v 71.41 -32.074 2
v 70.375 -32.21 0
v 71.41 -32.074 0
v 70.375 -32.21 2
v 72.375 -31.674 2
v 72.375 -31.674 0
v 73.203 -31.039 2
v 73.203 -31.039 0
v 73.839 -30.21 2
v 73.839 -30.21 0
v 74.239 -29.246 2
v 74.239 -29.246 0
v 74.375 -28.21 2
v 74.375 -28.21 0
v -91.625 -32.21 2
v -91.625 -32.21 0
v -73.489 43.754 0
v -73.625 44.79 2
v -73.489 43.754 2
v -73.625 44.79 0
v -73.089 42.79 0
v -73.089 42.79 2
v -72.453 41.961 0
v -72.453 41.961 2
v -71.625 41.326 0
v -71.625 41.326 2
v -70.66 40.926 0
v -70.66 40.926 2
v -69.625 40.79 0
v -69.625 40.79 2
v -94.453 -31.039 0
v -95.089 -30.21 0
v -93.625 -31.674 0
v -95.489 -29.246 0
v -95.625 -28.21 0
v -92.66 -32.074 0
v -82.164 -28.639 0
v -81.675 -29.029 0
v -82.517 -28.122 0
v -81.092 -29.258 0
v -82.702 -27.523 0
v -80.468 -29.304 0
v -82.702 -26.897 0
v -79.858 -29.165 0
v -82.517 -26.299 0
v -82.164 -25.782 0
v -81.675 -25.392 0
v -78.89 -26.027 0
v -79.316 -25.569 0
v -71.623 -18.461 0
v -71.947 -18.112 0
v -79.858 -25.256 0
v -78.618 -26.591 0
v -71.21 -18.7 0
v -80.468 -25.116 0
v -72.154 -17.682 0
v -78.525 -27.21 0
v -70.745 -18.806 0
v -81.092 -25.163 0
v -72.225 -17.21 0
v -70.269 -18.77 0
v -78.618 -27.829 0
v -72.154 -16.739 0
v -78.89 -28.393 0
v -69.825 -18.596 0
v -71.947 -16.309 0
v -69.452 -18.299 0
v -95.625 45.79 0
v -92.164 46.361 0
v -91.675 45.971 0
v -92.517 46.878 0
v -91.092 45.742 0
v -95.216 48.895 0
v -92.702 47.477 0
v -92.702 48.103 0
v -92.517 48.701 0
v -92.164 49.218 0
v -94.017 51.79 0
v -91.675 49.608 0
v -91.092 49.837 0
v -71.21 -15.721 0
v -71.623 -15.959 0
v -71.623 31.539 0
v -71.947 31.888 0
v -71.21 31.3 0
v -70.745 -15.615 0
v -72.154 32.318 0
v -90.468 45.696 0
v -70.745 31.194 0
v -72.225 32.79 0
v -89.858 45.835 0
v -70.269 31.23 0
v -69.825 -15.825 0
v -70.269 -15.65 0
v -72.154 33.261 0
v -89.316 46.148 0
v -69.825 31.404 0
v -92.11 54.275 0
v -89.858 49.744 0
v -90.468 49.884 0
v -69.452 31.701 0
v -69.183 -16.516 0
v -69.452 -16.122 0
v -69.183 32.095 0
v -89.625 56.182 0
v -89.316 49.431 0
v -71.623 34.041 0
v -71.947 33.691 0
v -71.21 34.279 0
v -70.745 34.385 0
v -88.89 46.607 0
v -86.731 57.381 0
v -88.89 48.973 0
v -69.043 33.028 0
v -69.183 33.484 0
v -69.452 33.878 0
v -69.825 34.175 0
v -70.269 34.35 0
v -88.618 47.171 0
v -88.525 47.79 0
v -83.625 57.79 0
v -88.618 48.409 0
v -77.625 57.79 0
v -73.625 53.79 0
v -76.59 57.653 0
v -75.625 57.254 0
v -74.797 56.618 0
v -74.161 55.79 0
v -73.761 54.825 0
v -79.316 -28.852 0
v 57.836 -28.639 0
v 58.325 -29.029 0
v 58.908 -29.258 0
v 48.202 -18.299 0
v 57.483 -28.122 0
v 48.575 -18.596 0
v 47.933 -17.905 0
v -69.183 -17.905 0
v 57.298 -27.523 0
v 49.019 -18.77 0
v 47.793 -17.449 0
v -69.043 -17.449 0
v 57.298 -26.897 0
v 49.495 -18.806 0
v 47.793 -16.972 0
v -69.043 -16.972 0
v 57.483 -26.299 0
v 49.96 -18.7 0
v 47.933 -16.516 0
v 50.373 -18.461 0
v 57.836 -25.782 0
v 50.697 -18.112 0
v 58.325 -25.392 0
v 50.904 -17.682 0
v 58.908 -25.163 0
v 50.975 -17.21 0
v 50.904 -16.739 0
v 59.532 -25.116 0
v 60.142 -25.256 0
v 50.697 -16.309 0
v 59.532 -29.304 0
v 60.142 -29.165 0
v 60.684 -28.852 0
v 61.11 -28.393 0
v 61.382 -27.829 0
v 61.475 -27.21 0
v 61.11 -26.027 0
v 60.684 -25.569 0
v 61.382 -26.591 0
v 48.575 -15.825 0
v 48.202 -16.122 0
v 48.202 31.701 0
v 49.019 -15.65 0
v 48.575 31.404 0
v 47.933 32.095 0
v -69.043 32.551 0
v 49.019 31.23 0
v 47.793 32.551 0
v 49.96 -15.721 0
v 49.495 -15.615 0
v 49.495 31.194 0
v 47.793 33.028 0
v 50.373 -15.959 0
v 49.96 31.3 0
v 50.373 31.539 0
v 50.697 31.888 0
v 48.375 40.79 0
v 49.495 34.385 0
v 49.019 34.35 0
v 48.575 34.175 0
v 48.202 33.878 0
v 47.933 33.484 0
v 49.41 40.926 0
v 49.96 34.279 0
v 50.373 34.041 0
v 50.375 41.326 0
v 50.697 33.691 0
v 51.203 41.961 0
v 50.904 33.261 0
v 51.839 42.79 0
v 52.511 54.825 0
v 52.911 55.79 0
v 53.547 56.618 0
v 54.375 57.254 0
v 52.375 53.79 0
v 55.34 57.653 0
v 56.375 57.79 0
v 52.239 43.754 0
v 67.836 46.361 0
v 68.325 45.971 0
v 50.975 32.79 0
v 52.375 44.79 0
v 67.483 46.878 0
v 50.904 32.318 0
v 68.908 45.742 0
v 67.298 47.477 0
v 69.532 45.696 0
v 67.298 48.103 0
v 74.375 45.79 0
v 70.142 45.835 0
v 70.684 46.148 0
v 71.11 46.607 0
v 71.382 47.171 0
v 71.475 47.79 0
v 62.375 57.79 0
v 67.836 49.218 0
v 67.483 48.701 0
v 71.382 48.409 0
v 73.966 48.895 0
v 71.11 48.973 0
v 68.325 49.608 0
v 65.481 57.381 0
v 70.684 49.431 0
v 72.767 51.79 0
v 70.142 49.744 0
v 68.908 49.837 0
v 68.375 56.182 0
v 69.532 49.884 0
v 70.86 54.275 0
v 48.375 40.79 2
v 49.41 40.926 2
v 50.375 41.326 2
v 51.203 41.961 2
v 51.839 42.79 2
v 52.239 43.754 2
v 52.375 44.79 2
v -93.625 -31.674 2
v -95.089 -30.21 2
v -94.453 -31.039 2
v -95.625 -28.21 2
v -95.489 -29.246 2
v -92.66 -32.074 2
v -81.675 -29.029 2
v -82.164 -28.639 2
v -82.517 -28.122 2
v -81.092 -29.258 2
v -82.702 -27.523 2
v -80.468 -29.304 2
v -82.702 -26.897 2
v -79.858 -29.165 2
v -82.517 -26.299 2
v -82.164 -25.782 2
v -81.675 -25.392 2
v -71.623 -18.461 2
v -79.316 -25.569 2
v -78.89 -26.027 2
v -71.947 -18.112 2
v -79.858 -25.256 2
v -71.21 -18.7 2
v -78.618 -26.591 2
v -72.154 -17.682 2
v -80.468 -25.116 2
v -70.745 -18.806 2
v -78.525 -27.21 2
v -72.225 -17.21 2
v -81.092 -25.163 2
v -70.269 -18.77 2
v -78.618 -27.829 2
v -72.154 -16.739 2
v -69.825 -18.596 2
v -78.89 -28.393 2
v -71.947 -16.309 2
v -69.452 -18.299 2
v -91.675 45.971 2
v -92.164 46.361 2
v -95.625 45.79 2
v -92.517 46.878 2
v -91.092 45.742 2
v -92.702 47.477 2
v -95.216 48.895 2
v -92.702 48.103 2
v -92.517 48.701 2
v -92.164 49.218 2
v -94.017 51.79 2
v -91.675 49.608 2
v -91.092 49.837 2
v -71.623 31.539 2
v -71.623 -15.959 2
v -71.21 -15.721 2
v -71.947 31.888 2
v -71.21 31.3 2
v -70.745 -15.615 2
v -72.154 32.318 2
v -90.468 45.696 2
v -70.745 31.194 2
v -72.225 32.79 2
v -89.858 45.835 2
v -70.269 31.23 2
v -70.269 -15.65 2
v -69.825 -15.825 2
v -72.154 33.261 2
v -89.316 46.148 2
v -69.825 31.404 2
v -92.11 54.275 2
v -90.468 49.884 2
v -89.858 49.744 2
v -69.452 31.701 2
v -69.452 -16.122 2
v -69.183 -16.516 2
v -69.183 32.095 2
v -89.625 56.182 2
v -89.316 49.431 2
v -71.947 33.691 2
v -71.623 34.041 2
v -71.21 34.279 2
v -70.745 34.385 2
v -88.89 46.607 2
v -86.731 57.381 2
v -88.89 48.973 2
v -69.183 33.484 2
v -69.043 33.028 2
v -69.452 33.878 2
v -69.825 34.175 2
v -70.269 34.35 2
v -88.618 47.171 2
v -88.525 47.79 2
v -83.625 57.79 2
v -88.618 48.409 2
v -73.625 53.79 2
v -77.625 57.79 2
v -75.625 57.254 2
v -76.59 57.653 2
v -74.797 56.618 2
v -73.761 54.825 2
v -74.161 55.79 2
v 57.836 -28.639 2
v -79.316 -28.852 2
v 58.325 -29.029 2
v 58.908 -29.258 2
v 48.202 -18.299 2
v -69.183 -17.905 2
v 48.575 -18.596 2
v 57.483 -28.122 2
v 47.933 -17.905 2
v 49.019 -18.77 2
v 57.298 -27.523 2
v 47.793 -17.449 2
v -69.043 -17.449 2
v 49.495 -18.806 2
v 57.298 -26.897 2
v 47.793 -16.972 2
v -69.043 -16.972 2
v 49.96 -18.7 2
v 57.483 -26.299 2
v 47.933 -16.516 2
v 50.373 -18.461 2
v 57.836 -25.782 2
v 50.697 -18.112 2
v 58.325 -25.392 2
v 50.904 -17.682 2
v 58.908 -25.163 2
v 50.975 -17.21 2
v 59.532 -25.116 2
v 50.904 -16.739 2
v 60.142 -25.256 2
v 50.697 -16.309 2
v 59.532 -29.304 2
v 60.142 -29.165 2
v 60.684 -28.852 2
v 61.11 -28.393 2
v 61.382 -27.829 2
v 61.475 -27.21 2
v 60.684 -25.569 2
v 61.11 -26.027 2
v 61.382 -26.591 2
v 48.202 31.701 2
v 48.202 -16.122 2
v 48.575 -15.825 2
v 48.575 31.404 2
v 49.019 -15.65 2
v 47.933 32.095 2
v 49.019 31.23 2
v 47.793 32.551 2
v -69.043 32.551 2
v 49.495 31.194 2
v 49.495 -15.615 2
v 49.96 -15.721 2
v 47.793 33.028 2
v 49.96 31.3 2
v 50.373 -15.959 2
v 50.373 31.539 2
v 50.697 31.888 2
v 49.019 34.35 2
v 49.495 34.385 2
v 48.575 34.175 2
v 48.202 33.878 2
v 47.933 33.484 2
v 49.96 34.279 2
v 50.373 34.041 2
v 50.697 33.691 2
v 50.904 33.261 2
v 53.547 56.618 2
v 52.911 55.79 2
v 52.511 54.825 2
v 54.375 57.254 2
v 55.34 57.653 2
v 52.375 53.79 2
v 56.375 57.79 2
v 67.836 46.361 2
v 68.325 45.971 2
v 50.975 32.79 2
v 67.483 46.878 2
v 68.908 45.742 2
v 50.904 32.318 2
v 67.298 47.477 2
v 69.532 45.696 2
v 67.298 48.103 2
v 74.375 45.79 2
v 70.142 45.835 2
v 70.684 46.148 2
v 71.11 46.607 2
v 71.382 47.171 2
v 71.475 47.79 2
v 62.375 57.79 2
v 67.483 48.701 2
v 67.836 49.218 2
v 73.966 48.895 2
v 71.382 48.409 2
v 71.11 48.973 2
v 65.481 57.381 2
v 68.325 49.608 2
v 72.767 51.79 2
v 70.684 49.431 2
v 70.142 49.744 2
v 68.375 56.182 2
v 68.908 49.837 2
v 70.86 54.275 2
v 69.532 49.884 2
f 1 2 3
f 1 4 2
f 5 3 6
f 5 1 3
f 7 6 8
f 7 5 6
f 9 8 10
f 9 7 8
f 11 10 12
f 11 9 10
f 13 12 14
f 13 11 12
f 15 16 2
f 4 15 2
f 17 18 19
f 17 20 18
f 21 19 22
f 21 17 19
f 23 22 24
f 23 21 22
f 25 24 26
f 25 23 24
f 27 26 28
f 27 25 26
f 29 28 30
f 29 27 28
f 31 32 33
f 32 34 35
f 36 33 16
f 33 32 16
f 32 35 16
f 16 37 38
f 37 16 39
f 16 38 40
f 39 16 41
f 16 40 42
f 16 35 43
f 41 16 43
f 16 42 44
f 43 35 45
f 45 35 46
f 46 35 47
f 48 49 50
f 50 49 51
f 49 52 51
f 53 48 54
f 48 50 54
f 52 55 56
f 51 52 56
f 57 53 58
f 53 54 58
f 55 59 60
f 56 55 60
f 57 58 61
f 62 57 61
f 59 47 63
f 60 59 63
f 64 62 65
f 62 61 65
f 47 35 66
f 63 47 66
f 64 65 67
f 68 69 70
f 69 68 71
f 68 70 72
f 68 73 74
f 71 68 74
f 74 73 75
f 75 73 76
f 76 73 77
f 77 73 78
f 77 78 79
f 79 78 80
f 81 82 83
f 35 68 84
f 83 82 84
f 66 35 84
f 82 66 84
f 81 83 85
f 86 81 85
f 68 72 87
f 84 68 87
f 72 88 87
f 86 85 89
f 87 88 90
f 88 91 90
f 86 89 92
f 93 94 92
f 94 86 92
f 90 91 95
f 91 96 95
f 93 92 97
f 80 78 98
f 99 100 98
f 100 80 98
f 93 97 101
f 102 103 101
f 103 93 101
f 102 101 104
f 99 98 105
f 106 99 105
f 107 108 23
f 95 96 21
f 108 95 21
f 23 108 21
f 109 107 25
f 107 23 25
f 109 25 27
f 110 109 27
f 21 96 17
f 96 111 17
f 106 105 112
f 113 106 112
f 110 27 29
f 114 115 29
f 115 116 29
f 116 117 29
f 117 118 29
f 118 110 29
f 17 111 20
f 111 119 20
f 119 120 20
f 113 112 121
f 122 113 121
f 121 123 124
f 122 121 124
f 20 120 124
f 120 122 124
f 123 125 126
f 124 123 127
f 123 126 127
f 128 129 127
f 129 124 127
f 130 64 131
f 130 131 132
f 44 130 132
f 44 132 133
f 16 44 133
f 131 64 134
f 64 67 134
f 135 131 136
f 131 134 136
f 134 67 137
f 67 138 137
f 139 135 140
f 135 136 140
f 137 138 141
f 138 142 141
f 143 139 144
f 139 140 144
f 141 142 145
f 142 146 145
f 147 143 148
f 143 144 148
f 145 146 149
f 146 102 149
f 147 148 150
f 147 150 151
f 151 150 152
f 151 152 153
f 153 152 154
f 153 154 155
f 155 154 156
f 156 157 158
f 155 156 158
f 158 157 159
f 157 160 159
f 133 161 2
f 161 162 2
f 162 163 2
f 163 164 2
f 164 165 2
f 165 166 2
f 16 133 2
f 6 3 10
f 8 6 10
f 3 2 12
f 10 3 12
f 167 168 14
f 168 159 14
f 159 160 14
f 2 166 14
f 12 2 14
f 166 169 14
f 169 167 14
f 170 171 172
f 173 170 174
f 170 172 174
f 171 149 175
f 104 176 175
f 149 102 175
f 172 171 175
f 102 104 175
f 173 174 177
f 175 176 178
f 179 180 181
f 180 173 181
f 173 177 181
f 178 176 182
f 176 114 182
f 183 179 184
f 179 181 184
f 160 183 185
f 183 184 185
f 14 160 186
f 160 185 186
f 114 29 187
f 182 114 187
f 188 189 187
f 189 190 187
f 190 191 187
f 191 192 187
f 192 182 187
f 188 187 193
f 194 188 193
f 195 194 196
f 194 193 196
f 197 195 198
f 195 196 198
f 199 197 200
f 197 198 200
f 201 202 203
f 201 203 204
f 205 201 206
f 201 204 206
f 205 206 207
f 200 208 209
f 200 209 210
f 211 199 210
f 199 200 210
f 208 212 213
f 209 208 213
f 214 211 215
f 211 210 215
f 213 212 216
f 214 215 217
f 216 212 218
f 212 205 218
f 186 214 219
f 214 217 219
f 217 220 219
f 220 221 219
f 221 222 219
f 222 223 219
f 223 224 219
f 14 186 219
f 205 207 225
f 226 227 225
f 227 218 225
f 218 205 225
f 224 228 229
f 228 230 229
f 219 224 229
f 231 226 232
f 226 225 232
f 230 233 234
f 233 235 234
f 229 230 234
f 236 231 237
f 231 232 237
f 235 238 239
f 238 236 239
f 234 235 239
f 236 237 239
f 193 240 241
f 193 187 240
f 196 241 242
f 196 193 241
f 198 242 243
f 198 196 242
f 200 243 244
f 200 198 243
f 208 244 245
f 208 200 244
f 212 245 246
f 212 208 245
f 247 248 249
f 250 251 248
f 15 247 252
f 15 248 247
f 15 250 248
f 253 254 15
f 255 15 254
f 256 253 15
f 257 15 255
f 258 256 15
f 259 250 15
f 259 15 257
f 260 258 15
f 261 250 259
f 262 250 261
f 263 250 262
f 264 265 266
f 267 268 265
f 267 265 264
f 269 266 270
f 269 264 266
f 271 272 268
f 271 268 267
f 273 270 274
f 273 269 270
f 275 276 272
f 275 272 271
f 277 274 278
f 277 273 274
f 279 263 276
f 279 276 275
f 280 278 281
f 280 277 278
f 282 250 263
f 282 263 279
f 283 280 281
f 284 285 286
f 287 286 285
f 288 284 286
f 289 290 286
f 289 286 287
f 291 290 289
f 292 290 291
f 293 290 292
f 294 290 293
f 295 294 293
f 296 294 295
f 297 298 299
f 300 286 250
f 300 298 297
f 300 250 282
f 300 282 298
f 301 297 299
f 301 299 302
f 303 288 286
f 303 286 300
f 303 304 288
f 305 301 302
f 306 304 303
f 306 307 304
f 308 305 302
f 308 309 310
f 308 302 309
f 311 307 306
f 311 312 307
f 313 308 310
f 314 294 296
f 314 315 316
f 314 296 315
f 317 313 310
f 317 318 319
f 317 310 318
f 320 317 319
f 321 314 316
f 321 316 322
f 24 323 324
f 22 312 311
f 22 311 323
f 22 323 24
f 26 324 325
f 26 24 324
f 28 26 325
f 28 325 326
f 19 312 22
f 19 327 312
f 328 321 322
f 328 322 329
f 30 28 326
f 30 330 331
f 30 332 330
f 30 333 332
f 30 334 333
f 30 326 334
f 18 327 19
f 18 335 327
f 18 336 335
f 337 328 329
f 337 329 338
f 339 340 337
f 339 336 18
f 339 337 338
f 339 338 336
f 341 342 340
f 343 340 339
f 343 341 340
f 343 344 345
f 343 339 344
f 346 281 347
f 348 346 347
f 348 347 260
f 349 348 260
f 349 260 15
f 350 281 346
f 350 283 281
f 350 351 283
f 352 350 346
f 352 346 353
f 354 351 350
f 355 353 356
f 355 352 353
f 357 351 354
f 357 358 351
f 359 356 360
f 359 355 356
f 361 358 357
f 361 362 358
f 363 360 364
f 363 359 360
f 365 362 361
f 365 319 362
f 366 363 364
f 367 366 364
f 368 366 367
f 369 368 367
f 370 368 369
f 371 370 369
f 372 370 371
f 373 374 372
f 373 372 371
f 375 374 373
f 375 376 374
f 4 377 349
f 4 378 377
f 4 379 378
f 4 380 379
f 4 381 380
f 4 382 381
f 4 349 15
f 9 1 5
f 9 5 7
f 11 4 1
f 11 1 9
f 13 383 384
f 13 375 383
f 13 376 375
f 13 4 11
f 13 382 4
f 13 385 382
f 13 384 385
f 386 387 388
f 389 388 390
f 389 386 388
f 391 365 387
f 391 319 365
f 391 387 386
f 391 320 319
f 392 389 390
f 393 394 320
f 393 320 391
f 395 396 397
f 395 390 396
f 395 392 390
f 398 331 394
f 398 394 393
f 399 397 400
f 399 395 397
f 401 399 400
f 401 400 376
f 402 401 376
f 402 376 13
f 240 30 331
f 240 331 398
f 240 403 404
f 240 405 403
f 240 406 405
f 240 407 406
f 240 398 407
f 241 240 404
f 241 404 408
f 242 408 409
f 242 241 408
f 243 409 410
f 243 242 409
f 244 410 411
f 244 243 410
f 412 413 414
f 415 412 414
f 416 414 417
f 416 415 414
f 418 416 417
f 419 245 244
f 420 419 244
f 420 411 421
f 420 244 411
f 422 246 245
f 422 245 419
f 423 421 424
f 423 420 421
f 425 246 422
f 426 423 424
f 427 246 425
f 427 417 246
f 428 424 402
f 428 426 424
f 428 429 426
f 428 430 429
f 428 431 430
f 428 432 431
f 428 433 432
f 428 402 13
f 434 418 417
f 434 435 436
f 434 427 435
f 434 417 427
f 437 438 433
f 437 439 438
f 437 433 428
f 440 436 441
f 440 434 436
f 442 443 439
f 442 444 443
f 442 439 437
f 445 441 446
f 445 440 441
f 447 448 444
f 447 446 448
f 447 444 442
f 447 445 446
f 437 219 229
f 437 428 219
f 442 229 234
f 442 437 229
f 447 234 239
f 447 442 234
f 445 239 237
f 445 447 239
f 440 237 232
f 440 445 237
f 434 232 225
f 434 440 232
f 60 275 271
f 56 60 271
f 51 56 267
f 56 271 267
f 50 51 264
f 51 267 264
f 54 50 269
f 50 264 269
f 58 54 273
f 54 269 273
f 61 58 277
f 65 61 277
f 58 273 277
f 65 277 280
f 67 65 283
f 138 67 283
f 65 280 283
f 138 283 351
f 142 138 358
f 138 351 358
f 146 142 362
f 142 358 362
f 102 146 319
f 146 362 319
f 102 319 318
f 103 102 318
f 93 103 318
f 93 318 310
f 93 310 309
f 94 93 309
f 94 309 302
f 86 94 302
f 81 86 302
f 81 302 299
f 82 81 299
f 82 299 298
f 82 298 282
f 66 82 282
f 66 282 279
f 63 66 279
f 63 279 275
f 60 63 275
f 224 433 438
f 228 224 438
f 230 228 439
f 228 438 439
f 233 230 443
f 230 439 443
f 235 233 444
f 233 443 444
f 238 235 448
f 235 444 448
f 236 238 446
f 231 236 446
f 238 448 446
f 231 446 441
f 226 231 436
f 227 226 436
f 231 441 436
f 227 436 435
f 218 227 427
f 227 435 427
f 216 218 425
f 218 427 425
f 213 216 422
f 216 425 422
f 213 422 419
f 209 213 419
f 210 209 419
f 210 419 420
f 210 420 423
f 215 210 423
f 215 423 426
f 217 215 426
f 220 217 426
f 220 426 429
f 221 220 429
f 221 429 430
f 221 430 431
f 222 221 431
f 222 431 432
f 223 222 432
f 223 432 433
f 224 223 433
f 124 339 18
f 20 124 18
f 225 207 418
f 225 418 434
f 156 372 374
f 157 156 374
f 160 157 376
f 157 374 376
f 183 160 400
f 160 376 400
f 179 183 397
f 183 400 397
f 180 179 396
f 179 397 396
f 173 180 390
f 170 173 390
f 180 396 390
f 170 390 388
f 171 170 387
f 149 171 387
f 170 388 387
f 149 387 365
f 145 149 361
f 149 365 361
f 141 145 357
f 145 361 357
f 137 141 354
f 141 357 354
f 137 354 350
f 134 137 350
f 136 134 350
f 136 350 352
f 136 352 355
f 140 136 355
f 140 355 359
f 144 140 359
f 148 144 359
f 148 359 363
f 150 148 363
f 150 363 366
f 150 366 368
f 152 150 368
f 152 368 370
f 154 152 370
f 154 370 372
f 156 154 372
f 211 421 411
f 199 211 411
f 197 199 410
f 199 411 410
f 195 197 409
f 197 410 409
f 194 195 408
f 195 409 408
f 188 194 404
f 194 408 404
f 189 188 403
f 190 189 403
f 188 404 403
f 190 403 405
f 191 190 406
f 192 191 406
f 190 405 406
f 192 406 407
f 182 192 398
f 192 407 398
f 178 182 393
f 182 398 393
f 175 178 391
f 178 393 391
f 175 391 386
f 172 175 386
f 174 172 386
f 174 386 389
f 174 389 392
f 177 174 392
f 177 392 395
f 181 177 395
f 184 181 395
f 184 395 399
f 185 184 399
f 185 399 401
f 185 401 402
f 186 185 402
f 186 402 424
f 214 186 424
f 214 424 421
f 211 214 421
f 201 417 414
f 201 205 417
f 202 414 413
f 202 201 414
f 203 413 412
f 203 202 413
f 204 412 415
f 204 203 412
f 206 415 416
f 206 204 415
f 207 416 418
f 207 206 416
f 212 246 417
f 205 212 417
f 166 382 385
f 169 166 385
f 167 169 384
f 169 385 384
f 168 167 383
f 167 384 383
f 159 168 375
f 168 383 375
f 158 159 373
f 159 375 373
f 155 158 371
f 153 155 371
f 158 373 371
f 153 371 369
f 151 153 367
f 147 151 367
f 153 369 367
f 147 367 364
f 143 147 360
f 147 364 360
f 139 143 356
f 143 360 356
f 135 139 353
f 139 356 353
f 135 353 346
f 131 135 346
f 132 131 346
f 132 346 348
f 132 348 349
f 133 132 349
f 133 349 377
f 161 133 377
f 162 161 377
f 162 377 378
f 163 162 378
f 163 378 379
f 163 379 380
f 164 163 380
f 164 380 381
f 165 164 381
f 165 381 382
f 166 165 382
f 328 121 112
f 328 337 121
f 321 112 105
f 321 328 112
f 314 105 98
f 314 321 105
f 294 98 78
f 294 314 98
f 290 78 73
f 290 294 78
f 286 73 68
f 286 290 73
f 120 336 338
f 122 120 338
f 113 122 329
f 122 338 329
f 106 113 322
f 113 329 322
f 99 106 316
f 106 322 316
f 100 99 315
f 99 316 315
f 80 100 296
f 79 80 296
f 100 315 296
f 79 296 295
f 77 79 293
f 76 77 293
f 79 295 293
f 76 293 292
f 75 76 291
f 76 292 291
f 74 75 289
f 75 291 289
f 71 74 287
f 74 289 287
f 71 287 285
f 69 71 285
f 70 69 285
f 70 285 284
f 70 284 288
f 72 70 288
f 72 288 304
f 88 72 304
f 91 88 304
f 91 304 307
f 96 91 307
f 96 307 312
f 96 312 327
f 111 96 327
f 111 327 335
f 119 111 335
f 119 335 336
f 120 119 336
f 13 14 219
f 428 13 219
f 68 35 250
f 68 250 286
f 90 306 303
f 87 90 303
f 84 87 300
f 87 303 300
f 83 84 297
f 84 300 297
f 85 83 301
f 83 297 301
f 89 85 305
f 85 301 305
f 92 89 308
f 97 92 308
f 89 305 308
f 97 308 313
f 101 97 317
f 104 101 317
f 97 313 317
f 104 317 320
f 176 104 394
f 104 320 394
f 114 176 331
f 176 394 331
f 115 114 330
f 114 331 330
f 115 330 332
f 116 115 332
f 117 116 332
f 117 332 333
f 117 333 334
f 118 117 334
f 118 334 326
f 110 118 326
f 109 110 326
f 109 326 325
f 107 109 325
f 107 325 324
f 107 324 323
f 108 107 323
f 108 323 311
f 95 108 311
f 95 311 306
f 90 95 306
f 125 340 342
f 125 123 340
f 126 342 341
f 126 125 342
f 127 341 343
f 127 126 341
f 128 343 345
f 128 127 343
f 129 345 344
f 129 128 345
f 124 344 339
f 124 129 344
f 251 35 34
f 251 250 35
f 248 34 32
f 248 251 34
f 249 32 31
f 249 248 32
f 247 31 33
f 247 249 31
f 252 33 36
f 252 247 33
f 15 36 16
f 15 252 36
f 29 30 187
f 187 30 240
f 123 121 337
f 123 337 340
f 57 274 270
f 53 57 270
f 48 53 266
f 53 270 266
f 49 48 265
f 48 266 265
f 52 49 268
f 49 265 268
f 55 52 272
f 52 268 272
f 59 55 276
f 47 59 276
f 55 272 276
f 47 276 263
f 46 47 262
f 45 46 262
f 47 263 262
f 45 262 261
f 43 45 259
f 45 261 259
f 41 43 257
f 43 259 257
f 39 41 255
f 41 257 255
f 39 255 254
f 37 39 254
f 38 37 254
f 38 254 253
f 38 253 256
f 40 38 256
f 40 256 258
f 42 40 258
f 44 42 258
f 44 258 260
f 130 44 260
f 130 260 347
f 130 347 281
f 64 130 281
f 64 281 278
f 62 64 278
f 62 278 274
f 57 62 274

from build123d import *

# Parameters (mm, degrees)
SKETCH_1_W          = 170
SKETCH_1_H          = 90
EXTRUDE_1_DEPTH     = 2
SKETCH_4_R          = 2.1
CUT_EXTRUDE_5_DEPTH = 10
FILLET_1_R          = 4
CUT_EXTRUDE_6_DEPTH = 112.748746927
SKETCH_7_R          = 1.6
CUT_EXTRUDE_7_DEPTH = 112.748746927
FILLET_2_R          = 4
FILLET_3_R          = 12


with BuildPart() as part:
    # 草图1 → 凸台-拉伸1 (new body)
    with BuildSketch(Plane.XY):
        with Locations((-10.625, 12.789634146)):
            Rectangle(SKETCH_1_W, SKETCH_1_H)
    extrude(amount=EXTRUDE_1_DEPTH)

    # 草图4 → 切除-拉伸5 (cut)
    with BuildSketch(Plane.XY.offset(2)):
        with Locations((59.375, -27.210365854)):
            Circle(SKETCH_4_R)
        with Locations((-80.625, -27.210365854)):
            Circle(SKETCH_4_R)
        with Locations((69.375, 47.789634146)):
            Circle(SKETCH_4_R)
        with Locations((-90.625, 47.789634146)):
            Circle(SKETCH_4_R)
    extrude(amount=-CUT_EXTRUDE_5_DEPTH, mode=Mode.SUBTRACT)

    # 圆角1
    fillet_1_edges = [part.edges().sort_by_distance(p)[0] for p in [
        (74.375, -32.210365854, 1),
        (-95.625, -32.210365854, 1),
    ]]
    fillet(fillet_1_edges, radius=FILLET_1_R)

    # 草图5 → 切除-拉伸6 (cut, through all)
    with BuildSketch(Plane.XY.offset(2)):
        Polygon((-73.625, 40.789634146), (52.375, 40.789634146), (52.375, 47.789634146), (52.375, 57.789634146), (2.375, 57.789634146), (-4.625, 57.789634146), (-73.625, 57.789634146), align=None)
    extrude(amount=-CUT_EXTRUDE_6_DEPTH, mode=Mode.SUBTRACT)

    # 草图7 → 切除-拉伸7 (cut, through all)
    with BuildSketch(Plane.XY.offset(2)):
        with Locations((49.375, 32.789634146)):
            Circle(SKETCH_7_R)
        with Locations((49.375, -17.210365854)):
            Circle(SKETCH_7_R)
        with Locations(Location((-70.625, -17.210365854, 0), (0, 0, 180))):
            Circle(SKETCH_7_R)
        with Locations(Location((-70.625, 32.789634146, 0), (0, 0, 180))):
            Circle(SKETCH_7_R)
    extrude(amount=-CUT_EXTRUDE_7_DEPTH, mode=Mode.SUBTRACT)

    # 圆角2
    fillet_2_edges = [part.edges().sort_by_distance(p)[0] for p in [
        (52.375, 40.789634146, 1),
        (-73.625, 40.789634146, 1),
        (-73.625, 57.789634146, 1),
        (52.375, 57.789634146, 1),
    ]]
    fillet(fillet_2_edges, radius=FILLET_2_R)

    # 圆角3
    fillet_3_edges = [part.edges().sort_by_distance(p)[0] for p in [
        (-95.625, 57.789634146, 1),
        (74.375, 57.789634146, 1),
    ]]
    fillet(fillet_3_edges, radius=FILLET_3_R)


solid = part.part
